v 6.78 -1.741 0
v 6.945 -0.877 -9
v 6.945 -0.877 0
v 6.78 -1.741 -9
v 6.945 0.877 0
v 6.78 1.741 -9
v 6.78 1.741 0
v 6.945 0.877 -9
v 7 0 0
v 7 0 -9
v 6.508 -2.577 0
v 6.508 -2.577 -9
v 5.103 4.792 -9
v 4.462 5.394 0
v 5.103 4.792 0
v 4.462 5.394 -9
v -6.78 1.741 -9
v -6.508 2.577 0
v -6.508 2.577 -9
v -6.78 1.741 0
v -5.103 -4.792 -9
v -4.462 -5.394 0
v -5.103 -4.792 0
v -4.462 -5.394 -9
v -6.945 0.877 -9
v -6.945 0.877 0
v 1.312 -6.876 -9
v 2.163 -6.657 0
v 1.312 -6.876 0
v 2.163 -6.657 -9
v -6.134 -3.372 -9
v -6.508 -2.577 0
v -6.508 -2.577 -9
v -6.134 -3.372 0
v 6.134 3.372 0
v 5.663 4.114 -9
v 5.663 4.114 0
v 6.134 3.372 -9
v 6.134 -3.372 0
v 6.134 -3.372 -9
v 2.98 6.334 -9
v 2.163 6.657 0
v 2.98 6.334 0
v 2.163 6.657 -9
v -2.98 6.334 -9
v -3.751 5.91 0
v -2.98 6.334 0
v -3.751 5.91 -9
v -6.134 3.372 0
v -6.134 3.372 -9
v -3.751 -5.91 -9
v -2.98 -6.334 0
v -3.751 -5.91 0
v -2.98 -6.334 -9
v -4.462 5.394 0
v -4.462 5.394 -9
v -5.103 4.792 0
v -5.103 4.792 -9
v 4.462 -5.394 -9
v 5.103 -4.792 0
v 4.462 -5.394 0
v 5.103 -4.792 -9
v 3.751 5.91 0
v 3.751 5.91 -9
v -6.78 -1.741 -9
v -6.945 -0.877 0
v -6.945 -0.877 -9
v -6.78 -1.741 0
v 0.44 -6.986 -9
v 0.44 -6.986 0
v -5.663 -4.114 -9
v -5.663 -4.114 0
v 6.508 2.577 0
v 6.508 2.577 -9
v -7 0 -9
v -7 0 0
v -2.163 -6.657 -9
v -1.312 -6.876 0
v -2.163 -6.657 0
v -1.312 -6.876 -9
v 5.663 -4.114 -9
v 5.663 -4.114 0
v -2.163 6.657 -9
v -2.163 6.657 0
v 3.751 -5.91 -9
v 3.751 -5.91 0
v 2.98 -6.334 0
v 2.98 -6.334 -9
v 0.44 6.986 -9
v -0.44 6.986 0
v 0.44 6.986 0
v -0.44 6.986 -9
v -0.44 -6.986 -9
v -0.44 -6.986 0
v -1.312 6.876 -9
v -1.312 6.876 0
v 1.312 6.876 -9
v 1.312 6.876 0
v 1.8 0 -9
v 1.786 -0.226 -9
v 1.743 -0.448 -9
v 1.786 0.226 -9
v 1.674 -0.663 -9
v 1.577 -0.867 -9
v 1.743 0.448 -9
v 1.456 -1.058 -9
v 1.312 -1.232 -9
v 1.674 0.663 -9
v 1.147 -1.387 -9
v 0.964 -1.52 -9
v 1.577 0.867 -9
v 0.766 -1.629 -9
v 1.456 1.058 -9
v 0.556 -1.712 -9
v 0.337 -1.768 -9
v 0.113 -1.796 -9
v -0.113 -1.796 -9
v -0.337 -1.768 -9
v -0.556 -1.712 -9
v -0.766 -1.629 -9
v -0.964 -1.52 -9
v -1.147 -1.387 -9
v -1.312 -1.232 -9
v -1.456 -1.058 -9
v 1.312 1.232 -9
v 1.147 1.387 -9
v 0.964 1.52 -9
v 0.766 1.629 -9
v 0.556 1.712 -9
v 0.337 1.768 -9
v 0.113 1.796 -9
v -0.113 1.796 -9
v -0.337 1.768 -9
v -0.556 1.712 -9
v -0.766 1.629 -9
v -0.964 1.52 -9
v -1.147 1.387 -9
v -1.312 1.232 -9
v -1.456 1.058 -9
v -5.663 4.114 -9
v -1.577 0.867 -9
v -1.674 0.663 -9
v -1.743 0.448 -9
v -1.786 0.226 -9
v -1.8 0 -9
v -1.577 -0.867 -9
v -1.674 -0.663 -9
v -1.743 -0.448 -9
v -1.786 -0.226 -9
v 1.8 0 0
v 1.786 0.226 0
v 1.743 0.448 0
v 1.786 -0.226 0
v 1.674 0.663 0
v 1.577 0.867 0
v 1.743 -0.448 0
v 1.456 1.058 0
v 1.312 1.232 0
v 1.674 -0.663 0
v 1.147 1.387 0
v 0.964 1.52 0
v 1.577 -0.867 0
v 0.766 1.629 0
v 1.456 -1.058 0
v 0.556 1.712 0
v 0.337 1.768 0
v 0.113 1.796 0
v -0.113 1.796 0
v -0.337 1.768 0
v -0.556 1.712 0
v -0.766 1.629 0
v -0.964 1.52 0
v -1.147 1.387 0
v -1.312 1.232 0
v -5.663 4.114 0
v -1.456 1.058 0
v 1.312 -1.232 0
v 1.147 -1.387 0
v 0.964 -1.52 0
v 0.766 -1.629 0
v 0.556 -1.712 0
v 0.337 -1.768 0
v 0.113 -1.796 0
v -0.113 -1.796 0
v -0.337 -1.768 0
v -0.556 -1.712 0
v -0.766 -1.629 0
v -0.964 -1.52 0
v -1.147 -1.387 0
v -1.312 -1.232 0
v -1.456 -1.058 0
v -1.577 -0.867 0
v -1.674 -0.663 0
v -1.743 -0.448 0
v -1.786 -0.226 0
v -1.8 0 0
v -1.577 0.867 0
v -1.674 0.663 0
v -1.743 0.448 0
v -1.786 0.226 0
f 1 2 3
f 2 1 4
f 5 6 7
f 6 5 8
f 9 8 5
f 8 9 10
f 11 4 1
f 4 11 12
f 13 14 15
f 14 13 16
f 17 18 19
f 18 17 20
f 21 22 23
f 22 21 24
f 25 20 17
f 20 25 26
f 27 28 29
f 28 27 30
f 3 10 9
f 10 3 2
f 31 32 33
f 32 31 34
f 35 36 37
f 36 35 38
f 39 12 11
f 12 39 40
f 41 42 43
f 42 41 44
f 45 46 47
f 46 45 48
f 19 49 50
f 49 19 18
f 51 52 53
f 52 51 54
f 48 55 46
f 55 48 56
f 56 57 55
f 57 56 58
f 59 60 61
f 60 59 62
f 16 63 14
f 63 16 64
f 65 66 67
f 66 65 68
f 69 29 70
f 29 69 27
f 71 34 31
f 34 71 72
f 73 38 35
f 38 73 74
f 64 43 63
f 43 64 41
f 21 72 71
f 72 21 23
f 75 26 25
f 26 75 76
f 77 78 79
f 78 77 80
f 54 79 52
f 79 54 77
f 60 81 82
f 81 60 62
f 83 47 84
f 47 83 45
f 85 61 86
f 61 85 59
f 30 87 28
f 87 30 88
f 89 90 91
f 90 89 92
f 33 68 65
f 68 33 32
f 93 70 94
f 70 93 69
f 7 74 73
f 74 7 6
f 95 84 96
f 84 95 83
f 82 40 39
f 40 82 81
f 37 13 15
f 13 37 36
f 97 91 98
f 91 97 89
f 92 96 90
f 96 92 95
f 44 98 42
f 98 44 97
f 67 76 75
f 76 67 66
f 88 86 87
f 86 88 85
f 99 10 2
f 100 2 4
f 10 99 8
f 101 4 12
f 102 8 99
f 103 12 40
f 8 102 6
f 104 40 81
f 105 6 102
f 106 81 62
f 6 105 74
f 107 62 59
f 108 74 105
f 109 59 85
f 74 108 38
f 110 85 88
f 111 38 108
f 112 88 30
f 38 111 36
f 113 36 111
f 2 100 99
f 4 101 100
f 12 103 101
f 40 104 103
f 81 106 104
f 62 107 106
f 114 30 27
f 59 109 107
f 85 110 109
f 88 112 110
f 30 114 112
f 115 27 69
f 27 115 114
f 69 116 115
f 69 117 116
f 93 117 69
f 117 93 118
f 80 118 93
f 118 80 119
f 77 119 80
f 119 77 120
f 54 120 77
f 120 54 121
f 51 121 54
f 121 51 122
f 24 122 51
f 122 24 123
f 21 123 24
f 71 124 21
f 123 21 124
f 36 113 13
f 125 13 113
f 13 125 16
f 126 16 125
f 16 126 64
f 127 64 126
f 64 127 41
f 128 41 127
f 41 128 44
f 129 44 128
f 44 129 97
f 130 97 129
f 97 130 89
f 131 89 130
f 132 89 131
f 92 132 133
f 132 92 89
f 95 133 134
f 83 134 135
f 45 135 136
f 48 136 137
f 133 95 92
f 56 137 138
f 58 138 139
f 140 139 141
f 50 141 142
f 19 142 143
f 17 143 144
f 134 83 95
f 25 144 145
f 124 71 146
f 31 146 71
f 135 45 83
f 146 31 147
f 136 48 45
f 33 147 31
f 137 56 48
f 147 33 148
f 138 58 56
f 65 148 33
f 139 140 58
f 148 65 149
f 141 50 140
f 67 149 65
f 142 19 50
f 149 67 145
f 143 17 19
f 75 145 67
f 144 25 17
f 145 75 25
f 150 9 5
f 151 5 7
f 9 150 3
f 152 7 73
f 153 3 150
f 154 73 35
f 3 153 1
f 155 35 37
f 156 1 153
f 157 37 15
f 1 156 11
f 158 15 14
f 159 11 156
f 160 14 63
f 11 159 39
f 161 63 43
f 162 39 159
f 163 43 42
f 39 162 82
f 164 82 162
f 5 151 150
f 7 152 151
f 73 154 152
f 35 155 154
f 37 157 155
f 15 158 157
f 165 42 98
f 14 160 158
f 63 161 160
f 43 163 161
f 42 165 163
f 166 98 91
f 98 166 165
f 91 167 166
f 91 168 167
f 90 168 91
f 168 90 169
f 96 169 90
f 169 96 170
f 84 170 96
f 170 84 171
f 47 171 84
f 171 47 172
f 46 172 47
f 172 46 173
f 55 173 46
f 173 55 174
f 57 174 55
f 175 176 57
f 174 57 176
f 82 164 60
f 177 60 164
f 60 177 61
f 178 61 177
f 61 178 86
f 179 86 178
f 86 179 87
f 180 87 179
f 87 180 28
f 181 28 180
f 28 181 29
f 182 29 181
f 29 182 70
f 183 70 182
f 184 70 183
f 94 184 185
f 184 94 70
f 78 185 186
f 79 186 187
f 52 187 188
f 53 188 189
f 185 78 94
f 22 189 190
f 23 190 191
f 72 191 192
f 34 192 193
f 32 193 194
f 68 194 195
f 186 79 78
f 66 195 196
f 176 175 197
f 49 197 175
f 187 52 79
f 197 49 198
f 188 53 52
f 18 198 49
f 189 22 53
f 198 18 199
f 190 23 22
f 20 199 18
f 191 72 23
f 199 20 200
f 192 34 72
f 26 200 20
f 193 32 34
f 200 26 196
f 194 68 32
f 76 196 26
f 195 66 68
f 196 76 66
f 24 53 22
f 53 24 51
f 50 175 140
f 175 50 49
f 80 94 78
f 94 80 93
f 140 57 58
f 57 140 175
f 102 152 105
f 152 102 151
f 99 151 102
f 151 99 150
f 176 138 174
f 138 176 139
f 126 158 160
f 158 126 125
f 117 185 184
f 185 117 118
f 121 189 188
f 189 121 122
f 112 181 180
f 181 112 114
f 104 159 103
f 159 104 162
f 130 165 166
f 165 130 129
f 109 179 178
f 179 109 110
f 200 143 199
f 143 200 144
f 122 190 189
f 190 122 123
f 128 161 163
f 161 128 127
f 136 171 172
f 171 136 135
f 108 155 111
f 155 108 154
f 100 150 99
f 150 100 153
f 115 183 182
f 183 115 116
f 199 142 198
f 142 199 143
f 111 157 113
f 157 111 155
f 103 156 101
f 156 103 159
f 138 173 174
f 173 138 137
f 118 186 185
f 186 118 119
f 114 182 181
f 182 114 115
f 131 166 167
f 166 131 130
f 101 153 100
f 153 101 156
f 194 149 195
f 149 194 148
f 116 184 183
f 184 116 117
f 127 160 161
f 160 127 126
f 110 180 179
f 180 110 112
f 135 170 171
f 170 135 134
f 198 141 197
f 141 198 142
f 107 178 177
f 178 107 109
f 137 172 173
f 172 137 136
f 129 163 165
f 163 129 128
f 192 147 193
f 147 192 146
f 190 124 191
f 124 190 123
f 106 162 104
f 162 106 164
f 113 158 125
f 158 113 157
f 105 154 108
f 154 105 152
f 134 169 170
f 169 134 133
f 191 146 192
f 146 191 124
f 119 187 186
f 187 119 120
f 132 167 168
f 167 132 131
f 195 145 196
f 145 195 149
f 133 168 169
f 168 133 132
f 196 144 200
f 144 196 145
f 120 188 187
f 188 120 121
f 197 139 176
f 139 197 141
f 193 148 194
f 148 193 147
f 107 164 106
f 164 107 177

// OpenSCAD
$fn = 50;


difference() {
	union() {
		translate(v = [0, 0, -9.0000000000]) {
			cylinder(h = 9, r = 7.0000000000);
		}
		cylinder(h = 0, r = 16.0000000000);
	}
	union() {
		#translate(v = [0, 0, -9]) {
			cylinder(h = 9, r = 1.8000000000);
		}
	}
}
